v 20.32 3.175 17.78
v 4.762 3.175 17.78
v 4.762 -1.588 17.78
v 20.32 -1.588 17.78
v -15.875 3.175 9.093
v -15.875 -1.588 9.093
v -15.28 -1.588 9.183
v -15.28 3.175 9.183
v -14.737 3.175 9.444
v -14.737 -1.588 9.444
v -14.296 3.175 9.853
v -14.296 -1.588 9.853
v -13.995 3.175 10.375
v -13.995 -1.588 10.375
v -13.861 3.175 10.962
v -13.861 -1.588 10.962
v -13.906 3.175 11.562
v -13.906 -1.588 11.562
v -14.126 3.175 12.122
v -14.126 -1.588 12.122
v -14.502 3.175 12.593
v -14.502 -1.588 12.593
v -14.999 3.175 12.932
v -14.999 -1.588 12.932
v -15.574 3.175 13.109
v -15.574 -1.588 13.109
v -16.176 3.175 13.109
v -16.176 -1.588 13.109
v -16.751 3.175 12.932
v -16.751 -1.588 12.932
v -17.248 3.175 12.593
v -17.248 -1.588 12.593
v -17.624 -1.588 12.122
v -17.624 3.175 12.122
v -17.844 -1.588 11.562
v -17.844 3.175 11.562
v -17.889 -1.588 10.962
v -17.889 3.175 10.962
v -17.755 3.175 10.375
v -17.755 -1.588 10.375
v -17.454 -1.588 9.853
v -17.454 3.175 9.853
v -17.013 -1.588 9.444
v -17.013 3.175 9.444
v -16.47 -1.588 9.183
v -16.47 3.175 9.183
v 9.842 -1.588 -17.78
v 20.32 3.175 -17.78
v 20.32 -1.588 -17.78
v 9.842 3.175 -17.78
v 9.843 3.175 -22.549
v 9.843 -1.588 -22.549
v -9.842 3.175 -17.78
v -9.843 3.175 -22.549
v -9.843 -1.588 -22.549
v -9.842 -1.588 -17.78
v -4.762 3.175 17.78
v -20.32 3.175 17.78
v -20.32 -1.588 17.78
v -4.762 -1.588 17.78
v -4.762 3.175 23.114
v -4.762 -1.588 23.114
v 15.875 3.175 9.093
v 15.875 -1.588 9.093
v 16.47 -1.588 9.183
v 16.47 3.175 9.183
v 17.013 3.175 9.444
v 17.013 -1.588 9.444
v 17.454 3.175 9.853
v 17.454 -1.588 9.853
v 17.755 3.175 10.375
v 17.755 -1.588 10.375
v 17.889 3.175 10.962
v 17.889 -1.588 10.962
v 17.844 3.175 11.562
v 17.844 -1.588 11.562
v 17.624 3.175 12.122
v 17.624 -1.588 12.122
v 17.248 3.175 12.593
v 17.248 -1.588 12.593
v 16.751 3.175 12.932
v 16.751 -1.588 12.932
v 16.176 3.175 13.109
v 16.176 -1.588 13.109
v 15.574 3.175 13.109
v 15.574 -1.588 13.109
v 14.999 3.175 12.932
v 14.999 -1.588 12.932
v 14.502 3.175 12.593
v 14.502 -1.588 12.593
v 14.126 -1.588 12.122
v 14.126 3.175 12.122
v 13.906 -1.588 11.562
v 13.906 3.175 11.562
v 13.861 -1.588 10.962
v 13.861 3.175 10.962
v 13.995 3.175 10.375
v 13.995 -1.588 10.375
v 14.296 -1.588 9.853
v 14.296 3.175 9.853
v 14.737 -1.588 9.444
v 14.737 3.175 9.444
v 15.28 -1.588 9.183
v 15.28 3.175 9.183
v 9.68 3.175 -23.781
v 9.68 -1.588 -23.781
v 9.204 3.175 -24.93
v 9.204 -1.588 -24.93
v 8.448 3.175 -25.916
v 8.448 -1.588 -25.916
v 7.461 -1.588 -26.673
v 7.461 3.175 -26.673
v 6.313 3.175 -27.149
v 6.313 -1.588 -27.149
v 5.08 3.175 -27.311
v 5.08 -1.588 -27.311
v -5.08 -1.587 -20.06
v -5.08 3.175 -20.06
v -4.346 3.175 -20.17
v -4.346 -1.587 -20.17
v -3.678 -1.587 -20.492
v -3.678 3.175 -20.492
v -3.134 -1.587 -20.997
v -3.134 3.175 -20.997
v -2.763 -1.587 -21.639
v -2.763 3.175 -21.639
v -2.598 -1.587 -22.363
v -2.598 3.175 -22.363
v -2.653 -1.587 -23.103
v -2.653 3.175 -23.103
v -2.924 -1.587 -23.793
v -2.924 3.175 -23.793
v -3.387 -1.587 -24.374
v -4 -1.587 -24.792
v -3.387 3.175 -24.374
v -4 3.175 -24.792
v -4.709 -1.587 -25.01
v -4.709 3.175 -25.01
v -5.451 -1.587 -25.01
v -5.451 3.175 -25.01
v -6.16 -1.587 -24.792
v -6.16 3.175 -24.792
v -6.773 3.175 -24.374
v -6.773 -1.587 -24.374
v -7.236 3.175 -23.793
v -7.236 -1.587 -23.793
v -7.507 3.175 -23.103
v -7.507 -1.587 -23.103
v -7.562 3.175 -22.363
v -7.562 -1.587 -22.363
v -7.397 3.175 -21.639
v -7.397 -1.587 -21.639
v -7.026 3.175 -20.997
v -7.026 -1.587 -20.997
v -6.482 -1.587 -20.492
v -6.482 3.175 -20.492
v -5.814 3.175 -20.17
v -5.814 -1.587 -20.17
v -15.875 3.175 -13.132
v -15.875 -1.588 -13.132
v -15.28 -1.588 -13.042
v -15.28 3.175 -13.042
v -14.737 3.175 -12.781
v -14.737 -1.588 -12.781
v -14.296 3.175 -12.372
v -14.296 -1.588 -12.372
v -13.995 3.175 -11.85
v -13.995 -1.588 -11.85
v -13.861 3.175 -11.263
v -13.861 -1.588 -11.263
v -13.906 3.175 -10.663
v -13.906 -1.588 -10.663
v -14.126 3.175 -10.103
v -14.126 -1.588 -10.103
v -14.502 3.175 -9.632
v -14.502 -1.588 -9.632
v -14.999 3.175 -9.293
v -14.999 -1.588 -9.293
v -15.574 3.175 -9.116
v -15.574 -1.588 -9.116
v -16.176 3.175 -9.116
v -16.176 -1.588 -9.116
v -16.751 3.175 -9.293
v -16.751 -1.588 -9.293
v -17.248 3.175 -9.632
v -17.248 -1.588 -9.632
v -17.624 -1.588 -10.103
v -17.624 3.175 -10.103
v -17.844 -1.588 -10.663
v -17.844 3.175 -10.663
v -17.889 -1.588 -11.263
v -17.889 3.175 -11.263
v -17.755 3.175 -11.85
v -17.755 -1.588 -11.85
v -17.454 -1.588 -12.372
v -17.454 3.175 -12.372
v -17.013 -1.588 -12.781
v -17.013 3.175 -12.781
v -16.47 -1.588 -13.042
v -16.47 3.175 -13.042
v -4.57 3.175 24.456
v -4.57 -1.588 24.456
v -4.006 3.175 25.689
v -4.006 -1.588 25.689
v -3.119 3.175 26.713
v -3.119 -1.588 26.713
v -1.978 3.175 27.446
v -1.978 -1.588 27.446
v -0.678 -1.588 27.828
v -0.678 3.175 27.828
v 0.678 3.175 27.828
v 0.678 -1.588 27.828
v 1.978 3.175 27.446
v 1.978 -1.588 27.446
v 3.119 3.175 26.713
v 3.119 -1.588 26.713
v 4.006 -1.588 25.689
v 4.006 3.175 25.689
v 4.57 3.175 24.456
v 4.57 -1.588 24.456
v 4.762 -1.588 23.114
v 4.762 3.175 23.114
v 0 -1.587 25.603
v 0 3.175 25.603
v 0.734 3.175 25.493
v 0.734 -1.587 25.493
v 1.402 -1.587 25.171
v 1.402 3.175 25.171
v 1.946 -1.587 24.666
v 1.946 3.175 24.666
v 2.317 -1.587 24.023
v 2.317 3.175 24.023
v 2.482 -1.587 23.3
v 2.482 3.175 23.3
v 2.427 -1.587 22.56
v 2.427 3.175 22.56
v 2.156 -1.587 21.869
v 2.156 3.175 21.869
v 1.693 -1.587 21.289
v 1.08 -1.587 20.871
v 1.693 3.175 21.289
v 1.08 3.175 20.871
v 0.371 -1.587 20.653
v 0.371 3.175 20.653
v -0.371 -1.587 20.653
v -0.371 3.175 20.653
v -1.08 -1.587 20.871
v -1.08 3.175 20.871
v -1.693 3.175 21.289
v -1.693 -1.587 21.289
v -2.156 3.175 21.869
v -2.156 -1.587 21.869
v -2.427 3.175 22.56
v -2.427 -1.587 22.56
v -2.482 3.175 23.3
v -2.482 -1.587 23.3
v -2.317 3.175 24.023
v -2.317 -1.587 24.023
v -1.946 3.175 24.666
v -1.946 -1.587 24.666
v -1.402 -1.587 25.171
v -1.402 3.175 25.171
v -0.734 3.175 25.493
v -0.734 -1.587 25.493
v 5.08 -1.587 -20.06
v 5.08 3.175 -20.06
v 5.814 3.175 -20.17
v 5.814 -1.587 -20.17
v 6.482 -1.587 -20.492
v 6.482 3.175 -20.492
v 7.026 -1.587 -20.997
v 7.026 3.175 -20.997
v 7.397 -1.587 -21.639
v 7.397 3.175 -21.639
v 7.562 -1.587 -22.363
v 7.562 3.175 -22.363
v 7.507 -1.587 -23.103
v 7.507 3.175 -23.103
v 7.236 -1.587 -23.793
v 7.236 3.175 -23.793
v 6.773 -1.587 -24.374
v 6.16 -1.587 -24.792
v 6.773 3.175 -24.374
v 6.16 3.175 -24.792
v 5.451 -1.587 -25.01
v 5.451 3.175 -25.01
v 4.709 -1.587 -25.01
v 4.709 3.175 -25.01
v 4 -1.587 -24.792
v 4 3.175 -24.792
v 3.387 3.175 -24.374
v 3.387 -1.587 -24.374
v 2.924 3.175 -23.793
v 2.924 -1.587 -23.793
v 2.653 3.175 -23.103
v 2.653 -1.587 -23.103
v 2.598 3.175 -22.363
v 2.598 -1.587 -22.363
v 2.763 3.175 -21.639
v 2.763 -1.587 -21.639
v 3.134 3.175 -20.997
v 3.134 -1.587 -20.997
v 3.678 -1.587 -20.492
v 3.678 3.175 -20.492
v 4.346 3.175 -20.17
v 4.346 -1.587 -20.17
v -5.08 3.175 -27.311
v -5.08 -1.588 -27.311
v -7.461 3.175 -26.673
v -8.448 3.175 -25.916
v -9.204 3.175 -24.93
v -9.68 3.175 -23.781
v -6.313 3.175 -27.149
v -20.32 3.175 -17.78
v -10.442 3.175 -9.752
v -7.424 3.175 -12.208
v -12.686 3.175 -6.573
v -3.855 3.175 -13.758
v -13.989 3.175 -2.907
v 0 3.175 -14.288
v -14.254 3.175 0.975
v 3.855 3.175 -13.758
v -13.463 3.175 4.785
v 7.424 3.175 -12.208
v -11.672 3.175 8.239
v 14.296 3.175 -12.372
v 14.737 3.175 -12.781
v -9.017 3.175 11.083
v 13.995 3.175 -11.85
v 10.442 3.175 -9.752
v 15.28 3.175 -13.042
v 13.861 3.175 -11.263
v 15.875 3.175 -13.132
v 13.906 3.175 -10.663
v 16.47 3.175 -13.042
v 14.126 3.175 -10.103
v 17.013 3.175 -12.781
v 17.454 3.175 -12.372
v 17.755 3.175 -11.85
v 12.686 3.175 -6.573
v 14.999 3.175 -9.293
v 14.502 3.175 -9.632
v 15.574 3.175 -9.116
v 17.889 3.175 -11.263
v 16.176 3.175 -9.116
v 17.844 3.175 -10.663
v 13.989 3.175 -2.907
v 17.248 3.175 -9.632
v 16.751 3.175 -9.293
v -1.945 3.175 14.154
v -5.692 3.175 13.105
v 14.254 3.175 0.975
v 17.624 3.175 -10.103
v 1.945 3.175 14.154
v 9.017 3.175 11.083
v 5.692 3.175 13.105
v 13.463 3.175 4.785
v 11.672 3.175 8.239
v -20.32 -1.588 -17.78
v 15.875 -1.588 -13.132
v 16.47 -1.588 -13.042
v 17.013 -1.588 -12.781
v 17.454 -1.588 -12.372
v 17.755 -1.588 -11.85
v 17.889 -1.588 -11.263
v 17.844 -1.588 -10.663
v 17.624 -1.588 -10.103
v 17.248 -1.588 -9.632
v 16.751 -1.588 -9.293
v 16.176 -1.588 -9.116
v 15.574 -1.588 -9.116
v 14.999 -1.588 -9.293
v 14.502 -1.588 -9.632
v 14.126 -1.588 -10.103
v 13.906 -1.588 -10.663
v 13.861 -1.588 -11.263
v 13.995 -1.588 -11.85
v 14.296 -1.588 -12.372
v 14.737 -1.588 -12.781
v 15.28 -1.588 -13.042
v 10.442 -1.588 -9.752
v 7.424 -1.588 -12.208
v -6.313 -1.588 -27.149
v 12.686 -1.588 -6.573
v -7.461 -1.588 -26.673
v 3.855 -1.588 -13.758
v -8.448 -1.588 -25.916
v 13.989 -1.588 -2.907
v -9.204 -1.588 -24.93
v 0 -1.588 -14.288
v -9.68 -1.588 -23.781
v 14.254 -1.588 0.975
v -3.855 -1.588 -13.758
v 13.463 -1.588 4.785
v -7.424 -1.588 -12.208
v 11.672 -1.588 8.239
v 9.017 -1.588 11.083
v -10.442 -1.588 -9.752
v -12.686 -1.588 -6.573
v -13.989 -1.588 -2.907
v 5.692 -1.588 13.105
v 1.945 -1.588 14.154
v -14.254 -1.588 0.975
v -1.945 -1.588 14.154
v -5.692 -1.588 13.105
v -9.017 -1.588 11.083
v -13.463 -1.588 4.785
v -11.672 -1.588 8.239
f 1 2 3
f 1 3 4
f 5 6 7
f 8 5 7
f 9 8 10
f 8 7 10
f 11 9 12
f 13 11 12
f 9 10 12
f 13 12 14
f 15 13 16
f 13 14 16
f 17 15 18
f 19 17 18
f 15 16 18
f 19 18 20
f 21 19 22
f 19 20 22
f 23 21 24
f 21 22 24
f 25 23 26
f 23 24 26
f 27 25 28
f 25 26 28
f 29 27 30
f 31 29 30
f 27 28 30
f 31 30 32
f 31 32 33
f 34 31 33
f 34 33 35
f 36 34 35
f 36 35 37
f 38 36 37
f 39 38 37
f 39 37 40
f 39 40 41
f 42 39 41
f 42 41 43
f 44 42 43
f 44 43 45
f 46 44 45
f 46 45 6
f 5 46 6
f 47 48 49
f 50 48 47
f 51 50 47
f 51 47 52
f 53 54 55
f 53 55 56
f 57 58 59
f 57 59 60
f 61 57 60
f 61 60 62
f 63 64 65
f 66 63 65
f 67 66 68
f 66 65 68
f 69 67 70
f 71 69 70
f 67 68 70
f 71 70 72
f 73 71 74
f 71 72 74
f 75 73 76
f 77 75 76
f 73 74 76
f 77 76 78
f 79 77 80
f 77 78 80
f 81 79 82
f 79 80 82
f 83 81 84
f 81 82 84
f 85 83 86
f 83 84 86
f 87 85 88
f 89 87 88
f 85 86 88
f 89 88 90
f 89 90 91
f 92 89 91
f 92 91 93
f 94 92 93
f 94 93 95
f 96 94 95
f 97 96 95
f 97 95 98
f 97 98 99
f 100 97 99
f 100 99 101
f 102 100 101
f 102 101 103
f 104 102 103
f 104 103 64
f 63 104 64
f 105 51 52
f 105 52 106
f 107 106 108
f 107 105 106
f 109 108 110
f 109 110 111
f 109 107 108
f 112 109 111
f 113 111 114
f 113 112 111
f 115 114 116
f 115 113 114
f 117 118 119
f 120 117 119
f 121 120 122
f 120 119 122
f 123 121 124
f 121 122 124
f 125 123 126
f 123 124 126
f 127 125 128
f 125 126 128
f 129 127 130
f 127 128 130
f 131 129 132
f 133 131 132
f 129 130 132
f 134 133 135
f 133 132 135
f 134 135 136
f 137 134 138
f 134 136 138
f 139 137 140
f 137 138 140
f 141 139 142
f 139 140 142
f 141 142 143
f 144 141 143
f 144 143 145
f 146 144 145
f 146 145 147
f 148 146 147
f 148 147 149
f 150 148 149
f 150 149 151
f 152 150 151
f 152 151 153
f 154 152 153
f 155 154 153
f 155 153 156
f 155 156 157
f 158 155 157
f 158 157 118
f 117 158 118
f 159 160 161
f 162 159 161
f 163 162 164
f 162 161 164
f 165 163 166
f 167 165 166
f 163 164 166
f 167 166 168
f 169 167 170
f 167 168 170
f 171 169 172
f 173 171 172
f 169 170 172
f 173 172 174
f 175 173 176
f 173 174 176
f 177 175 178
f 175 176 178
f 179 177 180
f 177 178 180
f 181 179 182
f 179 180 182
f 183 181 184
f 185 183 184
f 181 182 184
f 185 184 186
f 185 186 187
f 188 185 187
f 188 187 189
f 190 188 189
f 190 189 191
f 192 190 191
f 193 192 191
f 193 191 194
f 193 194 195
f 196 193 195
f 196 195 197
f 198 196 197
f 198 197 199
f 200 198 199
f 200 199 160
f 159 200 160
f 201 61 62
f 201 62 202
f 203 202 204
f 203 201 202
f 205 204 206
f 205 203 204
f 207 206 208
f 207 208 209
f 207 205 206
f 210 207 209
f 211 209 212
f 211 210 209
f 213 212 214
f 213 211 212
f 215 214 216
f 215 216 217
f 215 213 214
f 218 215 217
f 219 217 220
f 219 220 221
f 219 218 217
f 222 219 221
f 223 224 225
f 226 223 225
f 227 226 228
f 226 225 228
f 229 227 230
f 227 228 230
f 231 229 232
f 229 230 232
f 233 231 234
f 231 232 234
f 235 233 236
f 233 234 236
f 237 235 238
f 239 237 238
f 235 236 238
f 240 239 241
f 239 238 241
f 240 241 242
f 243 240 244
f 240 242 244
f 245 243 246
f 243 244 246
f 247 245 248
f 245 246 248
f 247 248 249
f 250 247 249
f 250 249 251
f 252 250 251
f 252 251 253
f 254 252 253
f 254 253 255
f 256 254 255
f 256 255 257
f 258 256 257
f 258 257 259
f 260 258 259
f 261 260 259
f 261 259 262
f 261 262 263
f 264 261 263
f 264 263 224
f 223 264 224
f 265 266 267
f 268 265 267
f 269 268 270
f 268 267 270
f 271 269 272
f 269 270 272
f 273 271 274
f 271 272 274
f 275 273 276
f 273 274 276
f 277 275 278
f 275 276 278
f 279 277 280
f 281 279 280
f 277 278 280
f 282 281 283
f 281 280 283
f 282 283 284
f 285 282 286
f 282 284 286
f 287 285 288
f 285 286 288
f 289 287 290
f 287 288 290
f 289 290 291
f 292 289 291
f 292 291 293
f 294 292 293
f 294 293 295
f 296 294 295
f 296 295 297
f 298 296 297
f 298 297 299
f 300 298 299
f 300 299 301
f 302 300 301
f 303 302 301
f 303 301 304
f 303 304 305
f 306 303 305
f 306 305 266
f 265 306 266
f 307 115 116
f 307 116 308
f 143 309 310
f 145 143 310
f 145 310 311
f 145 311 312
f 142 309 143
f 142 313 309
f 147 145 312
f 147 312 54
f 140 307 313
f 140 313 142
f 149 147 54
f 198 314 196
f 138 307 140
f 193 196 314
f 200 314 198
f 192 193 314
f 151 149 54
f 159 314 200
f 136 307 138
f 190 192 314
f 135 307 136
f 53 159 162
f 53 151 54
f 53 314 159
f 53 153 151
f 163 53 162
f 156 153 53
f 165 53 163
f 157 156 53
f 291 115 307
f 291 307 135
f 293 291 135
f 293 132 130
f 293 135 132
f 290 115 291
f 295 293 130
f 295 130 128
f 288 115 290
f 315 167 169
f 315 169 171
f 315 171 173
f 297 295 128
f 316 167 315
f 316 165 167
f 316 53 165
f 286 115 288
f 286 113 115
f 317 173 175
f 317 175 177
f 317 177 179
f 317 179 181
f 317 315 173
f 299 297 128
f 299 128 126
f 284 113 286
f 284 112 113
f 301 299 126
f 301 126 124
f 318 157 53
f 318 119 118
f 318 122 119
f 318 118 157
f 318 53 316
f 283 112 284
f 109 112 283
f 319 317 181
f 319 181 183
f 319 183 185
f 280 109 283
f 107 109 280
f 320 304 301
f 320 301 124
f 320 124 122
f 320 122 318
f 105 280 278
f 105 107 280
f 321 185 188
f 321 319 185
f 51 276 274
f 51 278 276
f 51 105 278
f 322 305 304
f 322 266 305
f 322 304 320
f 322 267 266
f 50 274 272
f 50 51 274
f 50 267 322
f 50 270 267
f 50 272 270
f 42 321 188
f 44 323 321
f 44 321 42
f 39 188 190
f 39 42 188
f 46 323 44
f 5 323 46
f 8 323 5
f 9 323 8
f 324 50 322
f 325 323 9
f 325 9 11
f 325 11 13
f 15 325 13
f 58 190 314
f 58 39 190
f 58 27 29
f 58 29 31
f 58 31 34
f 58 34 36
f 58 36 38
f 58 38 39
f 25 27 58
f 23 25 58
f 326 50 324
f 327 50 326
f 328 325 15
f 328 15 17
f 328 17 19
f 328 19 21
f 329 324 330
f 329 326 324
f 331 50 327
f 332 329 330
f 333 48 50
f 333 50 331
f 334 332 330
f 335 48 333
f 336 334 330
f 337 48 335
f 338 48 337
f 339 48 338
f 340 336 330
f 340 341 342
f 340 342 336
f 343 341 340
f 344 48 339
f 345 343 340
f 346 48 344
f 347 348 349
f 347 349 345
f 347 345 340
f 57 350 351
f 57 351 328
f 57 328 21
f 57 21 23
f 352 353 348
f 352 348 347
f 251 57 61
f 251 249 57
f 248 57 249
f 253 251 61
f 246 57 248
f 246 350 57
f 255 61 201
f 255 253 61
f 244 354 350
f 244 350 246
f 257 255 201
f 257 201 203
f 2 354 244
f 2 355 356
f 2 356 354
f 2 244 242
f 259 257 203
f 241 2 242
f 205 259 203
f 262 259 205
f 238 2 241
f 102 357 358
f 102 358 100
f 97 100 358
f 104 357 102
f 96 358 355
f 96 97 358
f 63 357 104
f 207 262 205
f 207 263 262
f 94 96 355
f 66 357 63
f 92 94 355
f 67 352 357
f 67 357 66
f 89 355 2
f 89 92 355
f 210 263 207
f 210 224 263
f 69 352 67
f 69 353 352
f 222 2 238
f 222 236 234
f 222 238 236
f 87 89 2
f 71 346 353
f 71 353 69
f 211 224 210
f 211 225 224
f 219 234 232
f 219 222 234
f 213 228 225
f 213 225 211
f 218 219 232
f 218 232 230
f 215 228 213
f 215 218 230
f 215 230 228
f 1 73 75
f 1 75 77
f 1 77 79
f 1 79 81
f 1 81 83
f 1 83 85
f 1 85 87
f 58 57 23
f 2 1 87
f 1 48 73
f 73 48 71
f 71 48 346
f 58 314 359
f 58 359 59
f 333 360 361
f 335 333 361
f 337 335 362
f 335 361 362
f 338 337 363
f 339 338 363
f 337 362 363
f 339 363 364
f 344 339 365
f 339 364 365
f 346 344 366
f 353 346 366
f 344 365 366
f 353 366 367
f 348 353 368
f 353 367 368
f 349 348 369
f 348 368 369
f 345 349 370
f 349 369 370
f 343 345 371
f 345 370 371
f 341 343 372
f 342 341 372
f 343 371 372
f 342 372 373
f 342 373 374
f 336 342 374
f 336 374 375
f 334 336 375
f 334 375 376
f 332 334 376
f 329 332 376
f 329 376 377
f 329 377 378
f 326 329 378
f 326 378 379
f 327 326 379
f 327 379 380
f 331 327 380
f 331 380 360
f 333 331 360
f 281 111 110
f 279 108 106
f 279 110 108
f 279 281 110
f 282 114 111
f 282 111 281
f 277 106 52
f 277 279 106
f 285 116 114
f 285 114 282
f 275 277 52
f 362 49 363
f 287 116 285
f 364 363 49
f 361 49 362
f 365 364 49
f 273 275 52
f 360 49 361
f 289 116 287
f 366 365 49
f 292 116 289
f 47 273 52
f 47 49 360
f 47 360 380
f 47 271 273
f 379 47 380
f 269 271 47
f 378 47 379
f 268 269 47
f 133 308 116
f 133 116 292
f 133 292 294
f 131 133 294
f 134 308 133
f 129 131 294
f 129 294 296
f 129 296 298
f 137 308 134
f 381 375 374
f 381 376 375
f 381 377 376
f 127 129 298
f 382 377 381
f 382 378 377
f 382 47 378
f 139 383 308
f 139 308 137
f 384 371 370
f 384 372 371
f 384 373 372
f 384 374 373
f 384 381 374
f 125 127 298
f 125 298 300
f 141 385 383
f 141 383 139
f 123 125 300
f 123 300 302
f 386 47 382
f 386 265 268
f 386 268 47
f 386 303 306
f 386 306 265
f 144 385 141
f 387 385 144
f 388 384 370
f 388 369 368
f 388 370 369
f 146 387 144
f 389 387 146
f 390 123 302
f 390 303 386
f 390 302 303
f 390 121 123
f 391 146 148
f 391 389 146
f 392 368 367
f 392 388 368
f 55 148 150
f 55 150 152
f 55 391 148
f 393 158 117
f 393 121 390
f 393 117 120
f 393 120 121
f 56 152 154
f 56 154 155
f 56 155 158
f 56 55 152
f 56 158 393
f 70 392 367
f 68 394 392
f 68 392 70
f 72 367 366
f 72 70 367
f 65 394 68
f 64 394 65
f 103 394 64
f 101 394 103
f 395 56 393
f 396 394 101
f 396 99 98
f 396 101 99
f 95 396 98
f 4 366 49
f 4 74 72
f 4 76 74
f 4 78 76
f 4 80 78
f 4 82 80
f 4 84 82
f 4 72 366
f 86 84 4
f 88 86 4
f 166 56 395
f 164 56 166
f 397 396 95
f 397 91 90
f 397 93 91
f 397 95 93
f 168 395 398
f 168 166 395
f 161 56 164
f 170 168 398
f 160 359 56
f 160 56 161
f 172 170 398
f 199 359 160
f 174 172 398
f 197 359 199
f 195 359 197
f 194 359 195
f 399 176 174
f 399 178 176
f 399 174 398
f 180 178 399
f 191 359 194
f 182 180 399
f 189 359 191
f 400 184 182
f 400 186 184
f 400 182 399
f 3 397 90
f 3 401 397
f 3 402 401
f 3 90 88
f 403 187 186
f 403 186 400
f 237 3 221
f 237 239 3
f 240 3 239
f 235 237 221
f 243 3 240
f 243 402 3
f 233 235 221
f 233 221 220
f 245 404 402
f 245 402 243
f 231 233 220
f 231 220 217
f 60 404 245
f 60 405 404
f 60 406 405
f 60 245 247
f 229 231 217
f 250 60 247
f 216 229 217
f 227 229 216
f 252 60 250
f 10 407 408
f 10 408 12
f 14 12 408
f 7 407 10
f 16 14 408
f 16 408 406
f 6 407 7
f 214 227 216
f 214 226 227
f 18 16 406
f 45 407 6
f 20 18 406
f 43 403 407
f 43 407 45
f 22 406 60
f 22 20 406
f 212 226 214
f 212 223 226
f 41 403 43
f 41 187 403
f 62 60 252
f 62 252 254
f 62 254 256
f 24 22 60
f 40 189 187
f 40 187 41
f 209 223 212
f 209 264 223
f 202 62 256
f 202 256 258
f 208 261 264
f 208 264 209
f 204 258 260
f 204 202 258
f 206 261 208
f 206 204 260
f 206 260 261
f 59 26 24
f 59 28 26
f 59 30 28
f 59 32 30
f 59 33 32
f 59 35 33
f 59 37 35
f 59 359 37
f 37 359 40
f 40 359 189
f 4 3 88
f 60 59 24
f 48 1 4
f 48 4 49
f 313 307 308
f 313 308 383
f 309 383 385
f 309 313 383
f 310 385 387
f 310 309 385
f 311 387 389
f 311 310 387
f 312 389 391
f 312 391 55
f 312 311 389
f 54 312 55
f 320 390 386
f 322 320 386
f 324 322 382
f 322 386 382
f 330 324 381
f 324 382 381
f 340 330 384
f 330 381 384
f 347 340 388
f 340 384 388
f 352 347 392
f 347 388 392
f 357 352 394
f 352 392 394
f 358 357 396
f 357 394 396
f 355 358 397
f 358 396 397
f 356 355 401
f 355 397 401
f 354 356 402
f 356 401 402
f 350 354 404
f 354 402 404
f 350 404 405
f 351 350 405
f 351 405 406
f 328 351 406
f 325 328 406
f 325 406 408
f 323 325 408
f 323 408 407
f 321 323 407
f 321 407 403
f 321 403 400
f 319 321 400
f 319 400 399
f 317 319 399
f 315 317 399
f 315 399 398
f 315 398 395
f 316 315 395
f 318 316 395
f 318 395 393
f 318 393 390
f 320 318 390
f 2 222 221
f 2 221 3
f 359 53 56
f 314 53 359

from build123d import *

# Parameters (mm, degrees)
SKETCH1_R              = 44.45
SKETCH1_R_2            = 6.35
BOSS_EXTRUDE1_DEPTH    = 3.175
SKETCH3_R              = 44.45
SKETCH3_R_2            = 27.94
CUT_EXTRUDE2_DEPTH     = 64.181702256
SKETCH7_R              = 2.4892
CUT_EXTRUDE6_DEPTH     = 41.020116192
SKETCH8_R              = 2.0193
CUT_EXTRUDE7_DEPTH     = 41.020116192
CUT_EXTRUDE8_START     = -1.5875
SKETCH9_R              = 27.94
CUT_EXTRUDE8_DEPTH     = 1.5875
CUT_EXTRUDE9_START     = -4.7625
CUT_EXTRUDE9_OUTLINE_R = 27.94
CUT_EXTRUDE9_DEPTH     = 4.7625
SKETCH11_R             = 14.2875
CUT_EXTRUDE10_DEPTH    = 35.823599161


# Read off the part's stored shape, not the designer's step: Cut-Extrude9
with BuildPart() as part:
    # Sketch1 → Boss-Extrude1 (new, symmetric)
    with BuildSketch(Plane(origin=(0, 0, 0), x_dir=(1, 0, 0), z_dir=(0, 1, 0))):
        with Locations(Location((0, 0, 0), (0, 0, 270))):
            Circle(SKETCH1_R)
        with Locations(Location((0, 0, 0), (0, 0, 270))):
            Circle(SKETCH1_R_2, mode=Mode.SUBTRACT)
    extrude(amount=BOSS_EXTRUDE1_DEPTH, both=True)

    # Sketch3 → Cut-Extrude2 (cut, through all)
    with BuildSketch(Plane(origin=(0, 3.175, 0), x_dir=(1, 0, 0), z_dir=(0, 1, 0))):
        Circle(SKETCH3_R)
        with Locations(Location((0, 0, 0), (0, 0, 270))):
            Circle(SKETCH3_R_2, mode=Mode.SUBTRACT)
    extrude(amount=-CUT_EXTRUDE2_DEPTH, mode=Mode.SUBTRACT)

    # Sketch7 → Cut-Extrude6 (cut, through all)
    with BuildSketch(Plane(origin=(0, 3.175, 0), x_dir=(1, 0, 0), z_dir=(0, 1, 0))):
        with Locations(Location((0, -23.114, 0), (0, 0, 270))):
            Circle(SKETCH7_R)
        with Locations(Location((-5.08, 22.548849106, 0), (0, 0, 270))):
            Circle(SKETCH7_R)
        with Locations(Location((5.08, 22.548849106, 0), (0, 0, 270))):
            Circle(SKETCH7_R)
    extrude(amount=-CUT_EXTRUDE6_DEPTH, mode=Mode.SUBTRACT)

    # Sketch8 → Cut-Extrude7 (cut, through all)
    with BuildSketch(Plane.XZ.offset(3.175)):
        with Locations(Location((-15.875, 11.1125, 0), (0, 0, 270))):
            Circle(SKETCH8_R)
        with Locations(Location((15.875, 11.1125, 0), (0, 0, 270))):
            Circle(SKETCH8_R)
        with Locations(Location((15.875, -11.1125, 0), (0, 0, 270))):
            Circle(SKETCH8_R)
        with Locations(Location((-15.875, -11.1125, 0), (0, 0, 270))):
            Circle(SKETCH8_R)
    extrude(amount=-CUT_EXTRUDE7_DEPTH, mode=Mode.SUBTRACT)

    # Sketch9 → Cut-Extrude8 (cut)
    with BuildSketch(Plane.XZ.offset(3.175).offset(CUT_EXTRUDE8_START)):
        with Locations(Location((0, 0, 0), (0, 0, 90))):
            Circle(SKETCH9_R)
    extrude(amount=CUT_EXTRUDE8_DEPTH, mode=Mode.SUBTRACT)

    # Cut-Extrude9 outline → Cut-Extrude9 (cut)
    with BuildSketch(Plane.XZ.offset(1.5875).offset(CUT_EXTRUDE9_START)):
        Circle(CUT_EXTRUDE9_OUTLINE_R)
        with BuildLine():
            Line((-20.32, 17.78), (-4.7625, 17.78))
            Line((-4.7625, 17.78), (-4.7625, 23.114))
            ThreePointArc((-4.7625, 23.114), (0, 27.8765), (4.7625, 23.114))
            Line((4.7625, 23.114), (4.7625, 17.78))
            Line((4.7625, 17.78), (20.32, 17.78))
            Line((20.32, 17.78), (20.32, -17.78))
            Line((20.32, -17.78), (9.8425, -17.78))
            Line((9.8425, -17.78), (9.8425, -22.548849106))
            ThreePointArc((9.8425, -22.548849106), (8.447596045, -25.916445151), (5.08, -27.311349106))
            Line((5.08, -27.311349106), (-5.08, -27.311349106))
            ThreePointArc((-5.08, -27.311349106), (-8.447596045, -25.916445151), (-9.8425, -22.548849106))
            Line((-9.8425, -22.548849106), (-9.8425, -17.78))
            Line((-9.8425, -17.78), (-20.32, -17.78))
            Line((-20.32, -17.78), (-20.32, 17.78))
        make_face(mode=Mode.SUBTRACT)
    extrude(amount=CUT_EXTRUDE9_DEPTH, mode=Mode.SUBTRACT)

    # Sketch11 → Cut-Extrude10 (cut, through all)
    with BuildSketch(Plane.XZ.offset(1.5875)):
        with Locations(Location((0, 0, 0), (0, 0, 270))):
            Circle(SKETCH11_R)
    extrude(amount=-CUT_EXTRUDE10_DEPTH, mode=Mode.SUBTRACT)


solid = part.part
